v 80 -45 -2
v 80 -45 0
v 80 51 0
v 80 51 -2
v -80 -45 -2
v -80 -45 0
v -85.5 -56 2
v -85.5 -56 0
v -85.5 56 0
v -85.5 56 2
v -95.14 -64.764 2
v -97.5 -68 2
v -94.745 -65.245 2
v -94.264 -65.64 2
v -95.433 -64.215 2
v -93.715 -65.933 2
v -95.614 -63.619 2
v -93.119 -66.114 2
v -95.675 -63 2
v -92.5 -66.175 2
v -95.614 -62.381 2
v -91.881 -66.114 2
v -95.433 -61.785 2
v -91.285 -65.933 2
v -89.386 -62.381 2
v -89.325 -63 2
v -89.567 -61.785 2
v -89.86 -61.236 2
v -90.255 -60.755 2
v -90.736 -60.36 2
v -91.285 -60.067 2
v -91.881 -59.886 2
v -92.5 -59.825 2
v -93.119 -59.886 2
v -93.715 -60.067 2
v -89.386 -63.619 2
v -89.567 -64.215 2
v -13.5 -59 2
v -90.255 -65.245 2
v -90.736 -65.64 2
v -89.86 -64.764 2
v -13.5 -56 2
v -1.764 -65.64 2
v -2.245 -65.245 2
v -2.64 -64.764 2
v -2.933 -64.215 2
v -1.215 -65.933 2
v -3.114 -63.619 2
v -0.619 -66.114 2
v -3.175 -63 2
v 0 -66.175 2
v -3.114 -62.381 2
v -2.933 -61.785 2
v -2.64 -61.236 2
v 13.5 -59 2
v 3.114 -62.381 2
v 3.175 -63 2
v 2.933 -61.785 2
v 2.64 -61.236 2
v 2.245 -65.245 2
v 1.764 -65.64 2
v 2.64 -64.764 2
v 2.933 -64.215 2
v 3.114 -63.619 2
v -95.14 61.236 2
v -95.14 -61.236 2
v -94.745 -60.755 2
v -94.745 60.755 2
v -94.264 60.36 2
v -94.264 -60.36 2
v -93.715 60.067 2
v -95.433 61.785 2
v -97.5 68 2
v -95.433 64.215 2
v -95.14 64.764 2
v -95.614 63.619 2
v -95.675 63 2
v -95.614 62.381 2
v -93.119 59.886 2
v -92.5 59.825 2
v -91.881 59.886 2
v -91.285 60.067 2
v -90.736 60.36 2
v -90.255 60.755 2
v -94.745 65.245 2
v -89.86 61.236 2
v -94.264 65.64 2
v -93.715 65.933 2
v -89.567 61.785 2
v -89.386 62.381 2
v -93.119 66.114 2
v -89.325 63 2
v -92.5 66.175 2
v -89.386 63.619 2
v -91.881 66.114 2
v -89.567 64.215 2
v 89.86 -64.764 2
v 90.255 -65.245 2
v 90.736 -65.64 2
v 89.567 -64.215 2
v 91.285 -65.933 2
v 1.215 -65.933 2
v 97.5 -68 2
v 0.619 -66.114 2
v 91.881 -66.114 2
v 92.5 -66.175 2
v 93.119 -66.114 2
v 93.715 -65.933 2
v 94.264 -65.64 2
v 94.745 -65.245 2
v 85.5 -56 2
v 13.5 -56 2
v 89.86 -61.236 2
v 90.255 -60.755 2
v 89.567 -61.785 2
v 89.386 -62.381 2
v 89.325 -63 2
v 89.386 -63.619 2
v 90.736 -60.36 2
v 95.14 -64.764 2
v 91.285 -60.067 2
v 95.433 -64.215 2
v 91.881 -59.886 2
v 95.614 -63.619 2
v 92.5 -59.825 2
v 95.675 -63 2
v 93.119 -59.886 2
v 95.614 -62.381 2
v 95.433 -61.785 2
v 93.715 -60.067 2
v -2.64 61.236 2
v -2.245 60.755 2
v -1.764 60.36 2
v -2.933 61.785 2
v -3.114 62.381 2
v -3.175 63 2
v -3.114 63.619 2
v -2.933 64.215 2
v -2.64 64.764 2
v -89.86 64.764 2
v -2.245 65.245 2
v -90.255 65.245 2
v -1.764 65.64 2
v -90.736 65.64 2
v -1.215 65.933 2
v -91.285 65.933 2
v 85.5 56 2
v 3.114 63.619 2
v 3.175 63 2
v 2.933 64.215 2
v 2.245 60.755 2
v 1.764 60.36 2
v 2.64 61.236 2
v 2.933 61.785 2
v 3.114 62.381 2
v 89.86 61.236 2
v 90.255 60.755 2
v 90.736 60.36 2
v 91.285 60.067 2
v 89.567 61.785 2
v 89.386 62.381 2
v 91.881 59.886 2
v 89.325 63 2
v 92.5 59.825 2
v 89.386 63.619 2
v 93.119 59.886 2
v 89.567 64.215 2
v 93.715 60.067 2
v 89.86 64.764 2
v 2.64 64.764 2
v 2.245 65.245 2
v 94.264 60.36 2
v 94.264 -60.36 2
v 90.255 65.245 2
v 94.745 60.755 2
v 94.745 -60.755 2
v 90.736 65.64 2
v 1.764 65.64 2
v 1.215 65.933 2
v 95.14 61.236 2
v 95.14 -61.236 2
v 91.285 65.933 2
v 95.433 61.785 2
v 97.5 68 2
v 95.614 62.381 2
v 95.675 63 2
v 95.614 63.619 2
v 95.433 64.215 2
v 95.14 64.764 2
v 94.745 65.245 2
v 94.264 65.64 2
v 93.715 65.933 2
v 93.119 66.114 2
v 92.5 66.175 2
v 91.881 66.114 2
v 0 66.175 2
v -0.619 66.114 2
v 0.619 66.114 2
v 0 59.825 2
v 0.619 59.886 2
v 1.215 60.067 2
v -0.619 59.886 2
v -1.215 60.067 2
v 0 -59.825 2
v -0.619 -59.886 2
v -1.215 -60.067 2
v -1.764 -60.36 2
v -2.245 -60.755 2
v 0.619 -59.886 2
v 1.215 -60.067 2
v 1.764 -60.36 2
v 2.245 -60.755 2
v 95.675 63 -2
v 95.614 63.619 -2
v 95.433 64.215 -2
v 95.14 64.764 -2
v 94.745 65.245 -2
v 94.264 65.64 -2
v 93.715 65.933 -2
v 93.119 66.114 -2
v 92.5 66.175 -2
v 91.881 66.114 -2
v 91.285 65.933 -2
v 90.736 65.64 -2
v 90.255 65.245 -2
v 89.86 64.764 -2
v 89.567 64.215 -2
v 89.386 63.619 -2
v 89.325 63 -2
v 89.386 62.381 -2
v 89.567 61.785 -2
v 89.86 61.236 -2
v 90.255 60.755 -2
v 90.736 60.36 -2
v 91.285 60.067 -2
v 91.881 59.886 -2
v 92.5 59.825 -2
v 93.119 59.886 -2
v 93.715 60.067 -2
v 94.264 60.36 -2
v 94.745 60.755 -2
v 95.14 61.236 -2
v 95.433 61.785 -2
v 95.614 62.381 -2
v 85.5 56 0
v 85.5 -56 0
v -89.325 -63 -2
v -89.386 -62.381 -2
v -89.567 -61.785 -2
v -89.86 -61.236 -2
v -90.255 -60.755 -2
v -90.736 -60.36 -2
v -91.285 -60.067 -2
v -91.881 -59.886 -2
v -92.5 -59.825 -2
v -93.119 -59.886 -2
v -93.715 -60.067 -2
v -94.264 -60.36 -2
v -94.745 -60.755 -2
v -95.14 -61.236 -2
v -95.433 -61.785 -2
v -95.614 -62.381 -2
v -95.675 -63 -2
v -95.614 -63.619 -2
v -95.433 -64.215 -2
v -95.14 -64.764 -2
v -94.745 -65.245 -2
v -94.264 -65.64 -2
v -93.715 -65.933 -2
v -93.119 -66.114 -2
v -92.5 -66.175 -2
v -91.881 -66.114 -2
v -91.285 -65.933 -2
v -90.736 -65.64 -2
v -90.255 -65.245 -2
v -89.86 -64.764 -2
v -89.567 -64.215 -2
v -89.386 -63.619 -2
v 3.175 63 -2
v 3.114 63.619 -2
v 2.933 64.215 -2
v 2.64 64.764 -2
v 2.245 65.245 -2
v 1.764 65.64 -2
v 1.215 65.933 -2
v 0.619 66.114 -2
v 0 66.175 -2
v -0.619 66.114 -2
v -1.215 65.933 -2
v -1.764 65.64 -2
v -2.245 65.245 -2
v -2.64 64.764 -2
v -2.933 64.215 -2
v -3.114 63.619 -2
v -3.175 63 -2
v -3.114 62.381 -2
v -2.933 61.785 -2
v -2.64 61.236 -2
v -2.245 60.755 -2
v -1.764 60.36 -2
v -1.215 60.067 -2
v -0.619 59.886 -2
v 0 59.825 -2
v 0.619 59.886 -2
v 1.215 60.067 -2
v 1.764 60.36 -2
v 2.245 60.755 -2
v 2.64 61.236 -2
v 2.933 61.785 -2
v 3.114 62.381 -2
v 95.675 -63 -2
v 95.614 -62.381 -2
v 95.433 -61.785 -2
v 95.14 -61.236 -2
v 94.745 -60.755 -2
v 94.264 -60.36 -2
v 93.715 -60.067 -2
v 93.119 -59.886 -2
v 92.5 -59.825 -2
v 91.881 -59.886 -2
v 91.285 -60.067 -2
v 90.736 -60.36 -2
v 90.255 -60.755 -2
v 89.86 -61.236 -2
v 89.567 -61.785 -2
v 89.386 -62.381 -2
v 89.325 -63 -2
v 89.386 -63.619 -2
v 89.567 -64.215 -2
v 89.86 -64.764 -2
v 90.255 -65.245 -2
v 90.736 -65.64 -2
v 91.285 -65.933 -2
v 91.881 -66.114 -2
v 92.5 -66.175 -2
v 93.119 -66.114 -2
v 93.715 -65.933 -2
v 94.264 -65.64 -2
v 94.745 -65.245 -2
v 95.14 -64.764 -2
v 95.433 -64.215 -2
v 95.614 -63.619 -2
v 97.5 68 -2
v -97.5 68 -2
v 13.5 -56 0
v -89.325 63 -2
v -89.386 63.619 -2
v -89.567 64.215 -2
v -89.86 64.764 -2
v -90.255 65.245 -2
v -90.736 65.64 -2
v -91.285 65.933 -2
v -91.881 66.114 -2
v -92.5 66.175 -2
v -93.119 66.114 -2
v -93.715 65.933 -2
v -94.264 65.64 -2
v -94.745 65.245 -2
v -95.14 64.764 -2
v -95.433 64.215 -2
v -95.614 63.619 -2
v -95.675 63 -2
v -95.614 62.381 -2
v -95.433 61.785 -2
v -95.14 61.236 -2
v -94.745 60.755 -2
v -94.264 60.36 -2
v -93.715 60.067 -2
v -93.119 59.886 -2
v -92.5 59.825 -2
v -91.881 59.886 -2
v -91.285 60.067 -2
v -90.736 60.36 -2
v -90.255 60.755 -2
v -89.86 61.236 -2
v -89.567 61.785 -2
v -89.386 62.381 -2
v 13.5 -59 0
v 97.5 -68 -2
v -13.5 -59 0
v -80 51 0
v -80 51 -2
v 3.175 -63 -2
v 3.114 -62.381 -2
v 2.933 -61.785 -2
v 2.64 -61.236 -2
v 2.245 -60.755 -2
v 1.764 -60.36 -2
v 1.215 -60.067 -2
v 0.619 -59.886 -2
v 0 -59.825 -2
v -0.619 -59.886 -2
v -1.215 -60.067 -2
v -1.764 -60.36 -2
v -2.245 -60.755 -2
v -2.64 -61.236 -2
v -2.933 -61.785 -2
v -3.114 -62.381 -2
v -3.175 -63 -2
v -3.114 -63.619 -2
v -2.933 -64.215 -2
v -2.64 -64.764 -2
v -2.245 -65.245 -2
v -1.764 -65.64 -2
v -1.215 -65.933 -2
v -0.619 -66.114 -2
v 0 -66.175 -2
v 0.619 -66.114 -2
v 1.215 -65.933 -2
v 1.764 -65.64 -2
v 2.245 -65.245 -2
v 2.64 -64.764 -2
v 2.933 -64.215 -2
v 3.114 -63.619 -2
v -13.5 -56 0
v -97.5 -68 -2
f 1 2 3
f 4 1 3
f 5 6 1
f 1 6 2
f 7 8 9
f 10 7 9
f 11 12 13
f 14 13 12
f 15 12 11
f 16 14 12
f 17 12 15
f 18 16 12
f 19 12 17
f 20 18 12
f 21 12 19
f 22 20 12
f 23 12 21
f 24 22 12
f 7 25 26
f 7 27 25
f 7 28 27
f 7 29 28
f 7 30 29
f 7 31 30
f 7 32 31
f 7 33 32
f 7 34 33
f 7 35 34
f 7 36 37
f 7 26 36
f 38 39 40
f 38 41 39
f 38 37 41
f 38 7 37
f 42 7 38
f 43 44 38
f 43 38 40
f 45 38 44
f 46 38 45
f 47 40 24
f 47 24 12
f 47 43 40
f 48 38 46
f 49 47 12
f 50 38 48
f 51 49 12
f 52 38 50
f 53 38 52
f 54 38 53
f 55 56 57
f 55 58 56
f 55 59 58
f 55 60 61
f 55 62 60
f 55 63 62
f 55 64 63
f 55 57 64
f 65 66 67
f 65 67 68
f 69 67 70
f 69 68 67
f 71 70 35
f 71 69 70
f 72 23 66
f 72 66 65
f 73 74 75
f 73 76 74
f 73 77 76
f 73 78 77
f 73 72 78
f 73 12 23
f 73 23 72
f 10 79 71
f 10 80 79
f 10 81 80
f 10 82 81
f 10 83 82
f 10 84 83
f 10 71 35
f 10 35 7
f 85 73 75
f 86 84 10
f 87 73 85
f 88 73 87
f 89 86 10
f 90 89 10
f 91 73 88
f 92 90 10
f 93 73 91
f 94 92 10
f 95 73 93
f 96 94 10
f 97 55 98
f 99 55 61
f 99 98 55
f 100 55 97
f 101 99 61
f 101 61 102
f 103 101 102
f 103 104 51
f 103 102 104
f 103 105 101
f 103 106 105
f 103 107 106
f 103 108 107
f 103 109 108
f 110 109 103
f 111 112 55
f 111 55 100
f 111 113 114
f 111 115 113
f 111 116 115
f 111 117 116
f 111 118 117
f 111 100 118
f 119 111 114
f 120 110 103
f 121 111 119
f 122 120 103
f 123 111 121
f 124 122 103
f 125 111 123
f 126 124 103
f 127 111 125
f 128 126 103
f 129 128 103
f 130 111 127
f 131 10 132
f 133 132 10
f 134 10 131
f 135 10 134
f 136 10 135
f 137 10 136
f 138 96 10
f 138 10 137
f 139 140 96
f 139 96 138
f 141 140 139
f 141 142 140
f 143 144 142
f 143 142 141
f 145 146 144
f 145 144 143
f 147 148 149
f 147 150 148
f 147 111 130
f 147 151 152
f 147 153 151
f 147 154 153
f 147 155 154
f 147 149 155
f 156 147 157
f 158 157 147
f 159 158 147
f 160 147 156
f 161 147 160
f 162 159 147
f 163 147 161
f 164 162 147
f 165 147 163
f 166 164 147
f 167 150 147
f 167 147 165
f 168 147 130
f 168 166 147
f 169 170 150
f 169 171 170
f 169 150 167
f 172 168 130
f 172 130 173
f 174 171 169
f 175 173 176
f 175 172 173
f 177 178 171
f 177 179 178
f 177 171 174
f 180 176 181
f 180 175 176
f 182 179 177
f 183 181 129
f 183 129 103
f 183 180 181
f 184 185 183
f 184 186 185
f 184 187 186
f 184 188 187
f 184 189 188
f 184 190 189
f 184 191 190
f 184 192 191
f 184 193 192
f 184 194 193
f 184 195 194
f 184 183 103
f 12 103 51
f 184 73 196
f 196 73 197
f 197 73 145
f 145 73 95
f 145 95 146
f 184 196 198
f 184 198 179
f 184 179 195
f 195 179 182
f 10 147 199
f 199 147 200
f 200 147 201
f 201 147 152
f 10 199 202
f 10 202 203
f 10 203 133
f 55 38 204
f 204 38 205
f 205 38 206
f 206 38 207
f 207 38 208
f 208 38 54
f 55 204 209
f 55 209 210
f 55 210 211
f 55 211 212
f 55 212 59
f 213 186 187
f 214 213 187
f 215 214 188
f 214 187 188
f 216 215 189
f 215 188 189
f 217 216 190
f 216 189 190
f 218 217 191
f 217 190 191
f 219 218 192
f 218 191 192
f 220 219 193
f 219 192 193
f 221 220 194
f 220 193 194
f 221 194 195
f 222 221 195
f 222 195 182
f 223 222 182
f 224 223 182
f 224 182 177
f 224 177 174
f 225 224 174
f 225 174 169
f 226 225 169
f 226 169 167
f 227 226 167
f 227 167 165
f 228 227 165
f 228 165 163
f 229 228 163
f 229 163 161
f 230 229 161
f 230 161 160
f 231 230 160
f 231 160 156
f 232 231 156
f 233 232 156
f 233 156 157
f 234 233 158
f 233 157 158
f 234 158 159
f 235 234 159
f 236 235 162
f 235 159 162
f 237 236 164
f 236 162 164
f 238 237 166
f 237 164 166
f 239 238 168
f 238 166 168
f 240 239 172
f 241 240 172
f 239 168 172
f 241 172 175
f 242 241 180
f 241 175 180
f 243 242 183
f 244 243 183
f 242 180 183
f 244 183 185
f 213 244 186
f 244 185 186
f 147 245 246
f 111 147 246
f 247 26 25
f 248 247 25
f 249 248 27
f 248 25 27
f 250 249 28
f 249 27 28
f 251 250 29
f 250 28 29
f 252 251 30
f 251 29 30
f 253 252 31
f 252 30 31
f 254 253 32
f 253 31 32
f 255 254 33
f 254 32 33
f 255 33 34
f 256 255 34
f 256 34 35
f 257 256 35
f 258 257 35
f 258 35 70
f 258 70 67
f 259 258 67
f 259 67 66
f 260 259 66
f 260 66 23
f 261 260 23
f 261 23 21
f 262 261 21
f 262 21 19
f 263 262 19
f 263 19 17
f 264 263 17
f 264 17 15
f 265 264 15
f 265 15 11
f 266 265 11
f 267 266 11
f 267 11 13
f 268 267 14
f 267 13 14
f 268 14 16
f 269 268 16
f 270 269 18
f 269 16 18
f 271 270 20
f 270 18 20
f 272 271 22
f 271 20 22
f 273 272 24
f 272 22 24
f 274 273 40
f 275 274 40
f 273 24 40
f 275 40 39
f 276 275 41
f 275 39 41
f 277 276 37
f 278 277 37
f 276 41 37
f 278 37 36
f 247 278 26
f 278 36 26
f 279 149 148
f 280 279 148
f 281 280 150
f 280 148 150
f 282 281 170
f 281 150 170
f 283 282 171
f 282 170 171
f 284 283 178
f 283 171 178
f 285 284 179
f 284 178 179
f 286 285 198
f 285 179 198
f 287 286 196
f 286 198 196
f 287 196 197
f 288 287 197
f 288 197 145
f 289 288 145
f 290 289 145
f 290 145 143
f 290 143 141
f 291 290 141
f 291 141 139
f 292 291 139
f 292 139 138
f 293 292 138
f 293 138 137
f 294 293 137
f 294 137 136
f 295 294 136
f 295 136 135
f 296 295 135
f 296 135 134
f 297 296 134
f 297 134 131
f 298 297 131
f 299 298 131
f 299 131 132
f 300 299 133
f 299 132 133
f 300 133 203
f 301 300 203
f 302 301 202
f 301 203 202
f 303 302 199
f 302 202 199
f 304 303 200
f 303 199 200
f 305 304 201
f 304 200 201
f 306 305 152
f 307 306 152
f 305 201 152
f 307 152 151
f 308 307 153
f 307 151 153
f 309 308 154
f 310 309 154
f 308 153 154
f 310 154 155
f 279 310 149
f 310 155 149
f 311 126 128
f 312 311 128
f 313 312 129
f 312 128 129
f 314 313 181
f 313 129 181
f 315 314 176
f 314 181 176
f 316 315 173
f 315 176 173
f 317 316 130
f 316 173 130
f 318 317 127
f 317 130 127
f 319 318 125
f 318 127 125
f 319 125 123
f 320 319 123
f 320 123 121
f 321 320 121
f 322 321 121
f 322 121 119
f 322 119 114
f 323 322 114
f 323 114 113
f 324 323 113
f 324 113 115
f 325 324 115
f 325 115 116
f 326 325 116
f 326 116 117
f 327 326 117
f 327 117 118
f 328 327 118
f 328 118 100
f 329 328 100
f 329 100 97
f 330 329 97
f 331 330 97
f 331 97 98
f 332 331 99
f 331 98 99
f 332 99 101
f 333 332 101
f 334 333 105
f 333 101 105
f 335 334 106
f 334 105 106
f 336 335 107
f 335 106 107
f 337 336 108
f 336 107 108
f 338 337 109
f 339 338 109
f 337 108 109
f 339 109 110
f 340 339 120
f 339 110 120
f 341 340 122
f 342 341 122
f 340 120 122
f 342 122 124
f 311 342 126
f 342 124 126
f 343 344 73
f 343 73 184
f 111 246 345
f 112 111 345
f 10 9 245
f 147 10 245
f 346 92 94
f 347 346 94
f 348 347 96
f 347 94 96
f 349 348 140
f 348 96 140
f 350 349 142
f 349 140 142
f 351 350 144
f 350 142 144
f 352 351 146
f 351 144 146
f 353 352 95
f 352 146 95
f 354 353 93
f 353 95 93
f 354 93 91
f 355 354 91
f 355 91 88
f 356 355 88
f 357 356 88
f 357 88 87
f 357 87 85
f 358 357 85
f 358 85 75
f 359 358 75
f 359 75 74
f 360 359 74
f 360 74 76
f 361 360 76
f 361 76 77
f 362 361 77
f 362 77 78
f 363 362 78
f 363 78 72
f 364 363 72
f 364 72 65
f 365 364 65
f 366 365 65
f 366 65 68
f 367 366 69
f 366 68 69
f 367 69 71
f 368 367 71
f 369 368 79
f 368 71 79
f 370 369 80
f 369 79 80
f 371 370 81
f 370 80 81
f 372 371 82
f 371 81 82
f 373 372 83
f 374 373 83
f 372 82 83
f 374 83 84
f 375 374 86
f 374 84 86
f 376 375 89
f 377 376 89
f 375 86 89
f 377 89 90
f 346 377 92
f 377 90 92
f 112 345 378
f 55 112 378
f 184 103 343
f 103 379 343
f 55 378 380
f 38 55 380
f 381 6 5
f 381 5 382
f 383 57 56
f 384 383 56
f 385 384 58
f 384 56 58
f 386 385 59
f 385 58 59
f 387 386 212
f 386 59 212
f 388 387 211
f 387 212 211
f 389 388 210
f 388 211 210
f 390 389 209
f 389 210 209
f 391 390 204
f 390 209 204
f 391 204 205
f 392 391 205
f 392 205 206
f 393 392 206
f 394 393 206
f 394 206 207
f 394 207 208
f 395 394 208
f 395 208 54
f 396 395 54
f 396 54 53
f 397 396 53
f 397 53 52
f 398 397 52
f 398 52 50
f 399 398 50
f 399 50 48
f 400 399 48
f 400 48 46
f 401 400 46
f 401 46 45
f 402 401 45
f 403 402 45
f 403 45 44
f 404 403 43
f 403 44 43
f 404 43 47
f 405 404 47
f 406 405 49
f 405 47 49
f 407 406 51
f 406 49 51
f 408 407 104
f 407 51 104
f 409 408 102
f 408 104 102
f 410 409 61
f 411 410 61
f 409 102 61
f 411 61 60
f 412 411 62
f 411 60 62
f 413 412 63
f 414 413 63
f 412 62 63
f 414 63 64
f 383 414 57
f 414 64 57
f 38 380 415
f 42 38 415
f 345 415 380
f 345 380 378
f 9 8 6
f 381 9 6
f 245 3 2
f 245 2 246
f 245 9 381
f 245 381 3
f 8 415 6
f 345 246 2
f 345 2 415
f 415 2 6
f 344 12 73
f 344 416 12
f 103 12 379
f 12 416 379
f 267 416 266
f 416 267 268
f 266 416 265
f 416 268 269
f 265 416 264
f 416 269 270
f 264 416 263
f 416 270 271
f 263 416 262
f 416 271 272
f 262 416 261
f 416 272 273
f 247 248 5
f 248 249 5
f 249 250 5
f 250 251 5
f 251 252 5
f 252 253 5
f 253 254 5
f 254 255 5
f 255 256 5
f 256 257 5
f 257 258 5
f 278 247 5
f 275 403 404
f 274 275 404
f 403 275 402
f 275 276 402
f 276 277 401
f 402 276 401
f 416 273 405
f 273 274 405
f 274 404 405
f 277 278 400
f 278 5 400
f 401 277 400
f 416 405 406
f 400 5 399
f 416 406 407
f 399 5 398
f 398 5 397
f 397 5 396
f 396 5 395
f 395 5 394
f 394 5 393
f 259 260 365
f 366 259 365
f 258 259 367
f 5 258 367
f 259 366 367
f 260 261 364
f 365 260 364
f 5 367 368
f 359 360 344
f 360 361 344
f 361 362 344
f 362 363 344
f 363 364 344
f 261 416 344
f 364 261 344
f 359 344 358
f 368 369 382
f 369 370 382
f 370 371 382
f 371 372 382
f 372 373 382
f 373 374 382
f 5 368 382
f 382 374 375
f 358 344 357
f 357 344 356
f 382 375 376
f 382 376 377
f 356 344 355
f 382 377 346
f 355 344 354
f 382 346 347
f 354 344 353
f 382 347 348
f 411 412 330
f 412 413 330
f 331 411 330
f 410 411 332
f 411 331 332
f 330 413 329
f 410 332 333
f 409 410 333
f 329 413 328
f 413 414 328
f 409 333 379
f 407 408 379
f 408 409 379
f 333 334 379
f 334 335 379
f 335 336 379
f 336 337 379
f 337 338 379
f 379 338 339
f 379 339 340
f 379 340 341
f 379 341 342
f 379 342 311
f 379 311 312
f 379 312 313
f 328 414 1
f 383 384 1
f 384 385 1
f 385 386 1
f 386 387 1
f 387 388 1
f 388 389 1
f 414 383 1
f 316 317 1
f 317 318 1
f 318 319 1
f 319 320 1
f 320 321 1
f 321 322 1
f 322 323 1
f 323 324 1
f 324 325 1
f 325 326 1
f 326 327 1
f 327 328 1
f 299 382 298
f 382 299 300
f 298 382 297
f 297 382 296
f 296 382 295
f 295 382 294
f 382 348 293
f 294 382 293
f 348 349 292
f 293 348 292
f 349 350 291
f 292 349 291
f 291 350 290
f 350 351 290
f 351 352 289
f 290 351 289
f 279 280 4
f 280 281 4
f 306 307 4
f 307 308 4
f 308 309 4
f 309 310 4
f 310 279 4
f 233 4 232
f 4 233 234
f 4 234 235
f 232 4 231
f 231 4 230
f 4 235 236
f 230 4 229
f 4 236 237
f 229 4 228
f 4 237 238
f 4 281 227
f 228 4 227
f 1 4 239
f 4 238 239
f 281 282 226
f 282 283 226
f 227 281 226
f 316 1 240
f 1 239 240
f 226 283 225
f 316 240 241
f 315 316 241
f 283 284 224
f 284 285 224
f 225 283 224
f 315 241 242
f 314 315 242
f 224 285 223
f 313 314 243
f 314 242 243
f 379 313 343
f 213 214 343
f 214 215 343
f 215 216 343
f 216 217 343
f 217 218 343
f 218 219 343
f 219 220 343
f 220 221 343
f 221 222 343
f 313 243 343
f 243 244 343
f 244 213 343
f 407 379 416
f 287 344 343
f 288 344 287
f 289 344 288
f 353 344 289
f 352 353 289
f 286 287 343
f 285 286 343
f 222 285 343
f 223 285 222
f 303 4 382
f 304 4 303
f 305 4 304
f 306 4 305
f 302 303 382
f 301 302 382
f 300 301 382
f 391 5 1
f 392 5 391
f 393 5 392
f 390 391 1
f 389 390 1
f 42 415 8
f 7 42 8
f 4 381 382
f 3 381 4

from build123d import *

# Parameters (mm, degrees)
SKETCH1_W           = 195
SKETCH1_H           = 136
SKETCH1_W_2         = 160
SKETCH1_H_2         = 96
BOSS_EXTRUDE1_DEPTH = 2
SKETCH1_3_W         = 195
SKETCH1_3_H         = 136
BOSS_EXTRUDE2_DEPTH = 2
SKETCH2_R           = 3.175
CUT_EXTRUDE1_DEPTH  = 119.938009064


with BuildPart() as part:
    # Sketch1 → Boss-Extrude1 (new body)
    with BuildSketch(Plane.XY):
        Rectangle(SKETCH1_W, SKETCH1_H)
        with Locations((0, 3)):
            Rectangle(SKETCH1_W_2, SKETCH1_H_2, mode=Mode.SUBTRACT)
    extrude(amount=-BOSS_EXTRUDE1_DEPTH)

    # Sketch1<3> → Boss-Extrude2 (add)
    with BuildSketch(Plane.XY):
        Rectangle(SKETCH1_3_W, SKETCH1_3_H)
        Polygon((85.5, 56), (85.5, -56), (13.5, -56), (13.5, -59), (-13.5, -59), (-13.5, -56), (-85.5, -56), (-85.5, 56), align=None, mode=Mode.SUBTRACT)
    extrude(amount=BOSS_EXTRUDE2_DEPTH)

    # Sketch2 → Cut-Extrude1 (cut, through all)
    with BuildSketch(Plane.XY.offset(2)):
        with Locations((-92.5, 63)):
            Circle(SKETCH2_R)
        with Locations((0, 63)):
            Circle(SKETCH2_R)
        with Locations((92.5, 63)):
            Circle(SKETCH2_R)
        with Locations((92.5, -63)):
            Circle(SKETCH2_R)
        with Locations((0, -63)):
            Circle(SKETCH2_R)
        with Locations((-92.5, -63)):
            Circle(SKETCH2_R)
    extrude(amount=-CUT_EXTRUDE1_DEPTH, mode=Mode.SUBTRACT)


solid = part.part
